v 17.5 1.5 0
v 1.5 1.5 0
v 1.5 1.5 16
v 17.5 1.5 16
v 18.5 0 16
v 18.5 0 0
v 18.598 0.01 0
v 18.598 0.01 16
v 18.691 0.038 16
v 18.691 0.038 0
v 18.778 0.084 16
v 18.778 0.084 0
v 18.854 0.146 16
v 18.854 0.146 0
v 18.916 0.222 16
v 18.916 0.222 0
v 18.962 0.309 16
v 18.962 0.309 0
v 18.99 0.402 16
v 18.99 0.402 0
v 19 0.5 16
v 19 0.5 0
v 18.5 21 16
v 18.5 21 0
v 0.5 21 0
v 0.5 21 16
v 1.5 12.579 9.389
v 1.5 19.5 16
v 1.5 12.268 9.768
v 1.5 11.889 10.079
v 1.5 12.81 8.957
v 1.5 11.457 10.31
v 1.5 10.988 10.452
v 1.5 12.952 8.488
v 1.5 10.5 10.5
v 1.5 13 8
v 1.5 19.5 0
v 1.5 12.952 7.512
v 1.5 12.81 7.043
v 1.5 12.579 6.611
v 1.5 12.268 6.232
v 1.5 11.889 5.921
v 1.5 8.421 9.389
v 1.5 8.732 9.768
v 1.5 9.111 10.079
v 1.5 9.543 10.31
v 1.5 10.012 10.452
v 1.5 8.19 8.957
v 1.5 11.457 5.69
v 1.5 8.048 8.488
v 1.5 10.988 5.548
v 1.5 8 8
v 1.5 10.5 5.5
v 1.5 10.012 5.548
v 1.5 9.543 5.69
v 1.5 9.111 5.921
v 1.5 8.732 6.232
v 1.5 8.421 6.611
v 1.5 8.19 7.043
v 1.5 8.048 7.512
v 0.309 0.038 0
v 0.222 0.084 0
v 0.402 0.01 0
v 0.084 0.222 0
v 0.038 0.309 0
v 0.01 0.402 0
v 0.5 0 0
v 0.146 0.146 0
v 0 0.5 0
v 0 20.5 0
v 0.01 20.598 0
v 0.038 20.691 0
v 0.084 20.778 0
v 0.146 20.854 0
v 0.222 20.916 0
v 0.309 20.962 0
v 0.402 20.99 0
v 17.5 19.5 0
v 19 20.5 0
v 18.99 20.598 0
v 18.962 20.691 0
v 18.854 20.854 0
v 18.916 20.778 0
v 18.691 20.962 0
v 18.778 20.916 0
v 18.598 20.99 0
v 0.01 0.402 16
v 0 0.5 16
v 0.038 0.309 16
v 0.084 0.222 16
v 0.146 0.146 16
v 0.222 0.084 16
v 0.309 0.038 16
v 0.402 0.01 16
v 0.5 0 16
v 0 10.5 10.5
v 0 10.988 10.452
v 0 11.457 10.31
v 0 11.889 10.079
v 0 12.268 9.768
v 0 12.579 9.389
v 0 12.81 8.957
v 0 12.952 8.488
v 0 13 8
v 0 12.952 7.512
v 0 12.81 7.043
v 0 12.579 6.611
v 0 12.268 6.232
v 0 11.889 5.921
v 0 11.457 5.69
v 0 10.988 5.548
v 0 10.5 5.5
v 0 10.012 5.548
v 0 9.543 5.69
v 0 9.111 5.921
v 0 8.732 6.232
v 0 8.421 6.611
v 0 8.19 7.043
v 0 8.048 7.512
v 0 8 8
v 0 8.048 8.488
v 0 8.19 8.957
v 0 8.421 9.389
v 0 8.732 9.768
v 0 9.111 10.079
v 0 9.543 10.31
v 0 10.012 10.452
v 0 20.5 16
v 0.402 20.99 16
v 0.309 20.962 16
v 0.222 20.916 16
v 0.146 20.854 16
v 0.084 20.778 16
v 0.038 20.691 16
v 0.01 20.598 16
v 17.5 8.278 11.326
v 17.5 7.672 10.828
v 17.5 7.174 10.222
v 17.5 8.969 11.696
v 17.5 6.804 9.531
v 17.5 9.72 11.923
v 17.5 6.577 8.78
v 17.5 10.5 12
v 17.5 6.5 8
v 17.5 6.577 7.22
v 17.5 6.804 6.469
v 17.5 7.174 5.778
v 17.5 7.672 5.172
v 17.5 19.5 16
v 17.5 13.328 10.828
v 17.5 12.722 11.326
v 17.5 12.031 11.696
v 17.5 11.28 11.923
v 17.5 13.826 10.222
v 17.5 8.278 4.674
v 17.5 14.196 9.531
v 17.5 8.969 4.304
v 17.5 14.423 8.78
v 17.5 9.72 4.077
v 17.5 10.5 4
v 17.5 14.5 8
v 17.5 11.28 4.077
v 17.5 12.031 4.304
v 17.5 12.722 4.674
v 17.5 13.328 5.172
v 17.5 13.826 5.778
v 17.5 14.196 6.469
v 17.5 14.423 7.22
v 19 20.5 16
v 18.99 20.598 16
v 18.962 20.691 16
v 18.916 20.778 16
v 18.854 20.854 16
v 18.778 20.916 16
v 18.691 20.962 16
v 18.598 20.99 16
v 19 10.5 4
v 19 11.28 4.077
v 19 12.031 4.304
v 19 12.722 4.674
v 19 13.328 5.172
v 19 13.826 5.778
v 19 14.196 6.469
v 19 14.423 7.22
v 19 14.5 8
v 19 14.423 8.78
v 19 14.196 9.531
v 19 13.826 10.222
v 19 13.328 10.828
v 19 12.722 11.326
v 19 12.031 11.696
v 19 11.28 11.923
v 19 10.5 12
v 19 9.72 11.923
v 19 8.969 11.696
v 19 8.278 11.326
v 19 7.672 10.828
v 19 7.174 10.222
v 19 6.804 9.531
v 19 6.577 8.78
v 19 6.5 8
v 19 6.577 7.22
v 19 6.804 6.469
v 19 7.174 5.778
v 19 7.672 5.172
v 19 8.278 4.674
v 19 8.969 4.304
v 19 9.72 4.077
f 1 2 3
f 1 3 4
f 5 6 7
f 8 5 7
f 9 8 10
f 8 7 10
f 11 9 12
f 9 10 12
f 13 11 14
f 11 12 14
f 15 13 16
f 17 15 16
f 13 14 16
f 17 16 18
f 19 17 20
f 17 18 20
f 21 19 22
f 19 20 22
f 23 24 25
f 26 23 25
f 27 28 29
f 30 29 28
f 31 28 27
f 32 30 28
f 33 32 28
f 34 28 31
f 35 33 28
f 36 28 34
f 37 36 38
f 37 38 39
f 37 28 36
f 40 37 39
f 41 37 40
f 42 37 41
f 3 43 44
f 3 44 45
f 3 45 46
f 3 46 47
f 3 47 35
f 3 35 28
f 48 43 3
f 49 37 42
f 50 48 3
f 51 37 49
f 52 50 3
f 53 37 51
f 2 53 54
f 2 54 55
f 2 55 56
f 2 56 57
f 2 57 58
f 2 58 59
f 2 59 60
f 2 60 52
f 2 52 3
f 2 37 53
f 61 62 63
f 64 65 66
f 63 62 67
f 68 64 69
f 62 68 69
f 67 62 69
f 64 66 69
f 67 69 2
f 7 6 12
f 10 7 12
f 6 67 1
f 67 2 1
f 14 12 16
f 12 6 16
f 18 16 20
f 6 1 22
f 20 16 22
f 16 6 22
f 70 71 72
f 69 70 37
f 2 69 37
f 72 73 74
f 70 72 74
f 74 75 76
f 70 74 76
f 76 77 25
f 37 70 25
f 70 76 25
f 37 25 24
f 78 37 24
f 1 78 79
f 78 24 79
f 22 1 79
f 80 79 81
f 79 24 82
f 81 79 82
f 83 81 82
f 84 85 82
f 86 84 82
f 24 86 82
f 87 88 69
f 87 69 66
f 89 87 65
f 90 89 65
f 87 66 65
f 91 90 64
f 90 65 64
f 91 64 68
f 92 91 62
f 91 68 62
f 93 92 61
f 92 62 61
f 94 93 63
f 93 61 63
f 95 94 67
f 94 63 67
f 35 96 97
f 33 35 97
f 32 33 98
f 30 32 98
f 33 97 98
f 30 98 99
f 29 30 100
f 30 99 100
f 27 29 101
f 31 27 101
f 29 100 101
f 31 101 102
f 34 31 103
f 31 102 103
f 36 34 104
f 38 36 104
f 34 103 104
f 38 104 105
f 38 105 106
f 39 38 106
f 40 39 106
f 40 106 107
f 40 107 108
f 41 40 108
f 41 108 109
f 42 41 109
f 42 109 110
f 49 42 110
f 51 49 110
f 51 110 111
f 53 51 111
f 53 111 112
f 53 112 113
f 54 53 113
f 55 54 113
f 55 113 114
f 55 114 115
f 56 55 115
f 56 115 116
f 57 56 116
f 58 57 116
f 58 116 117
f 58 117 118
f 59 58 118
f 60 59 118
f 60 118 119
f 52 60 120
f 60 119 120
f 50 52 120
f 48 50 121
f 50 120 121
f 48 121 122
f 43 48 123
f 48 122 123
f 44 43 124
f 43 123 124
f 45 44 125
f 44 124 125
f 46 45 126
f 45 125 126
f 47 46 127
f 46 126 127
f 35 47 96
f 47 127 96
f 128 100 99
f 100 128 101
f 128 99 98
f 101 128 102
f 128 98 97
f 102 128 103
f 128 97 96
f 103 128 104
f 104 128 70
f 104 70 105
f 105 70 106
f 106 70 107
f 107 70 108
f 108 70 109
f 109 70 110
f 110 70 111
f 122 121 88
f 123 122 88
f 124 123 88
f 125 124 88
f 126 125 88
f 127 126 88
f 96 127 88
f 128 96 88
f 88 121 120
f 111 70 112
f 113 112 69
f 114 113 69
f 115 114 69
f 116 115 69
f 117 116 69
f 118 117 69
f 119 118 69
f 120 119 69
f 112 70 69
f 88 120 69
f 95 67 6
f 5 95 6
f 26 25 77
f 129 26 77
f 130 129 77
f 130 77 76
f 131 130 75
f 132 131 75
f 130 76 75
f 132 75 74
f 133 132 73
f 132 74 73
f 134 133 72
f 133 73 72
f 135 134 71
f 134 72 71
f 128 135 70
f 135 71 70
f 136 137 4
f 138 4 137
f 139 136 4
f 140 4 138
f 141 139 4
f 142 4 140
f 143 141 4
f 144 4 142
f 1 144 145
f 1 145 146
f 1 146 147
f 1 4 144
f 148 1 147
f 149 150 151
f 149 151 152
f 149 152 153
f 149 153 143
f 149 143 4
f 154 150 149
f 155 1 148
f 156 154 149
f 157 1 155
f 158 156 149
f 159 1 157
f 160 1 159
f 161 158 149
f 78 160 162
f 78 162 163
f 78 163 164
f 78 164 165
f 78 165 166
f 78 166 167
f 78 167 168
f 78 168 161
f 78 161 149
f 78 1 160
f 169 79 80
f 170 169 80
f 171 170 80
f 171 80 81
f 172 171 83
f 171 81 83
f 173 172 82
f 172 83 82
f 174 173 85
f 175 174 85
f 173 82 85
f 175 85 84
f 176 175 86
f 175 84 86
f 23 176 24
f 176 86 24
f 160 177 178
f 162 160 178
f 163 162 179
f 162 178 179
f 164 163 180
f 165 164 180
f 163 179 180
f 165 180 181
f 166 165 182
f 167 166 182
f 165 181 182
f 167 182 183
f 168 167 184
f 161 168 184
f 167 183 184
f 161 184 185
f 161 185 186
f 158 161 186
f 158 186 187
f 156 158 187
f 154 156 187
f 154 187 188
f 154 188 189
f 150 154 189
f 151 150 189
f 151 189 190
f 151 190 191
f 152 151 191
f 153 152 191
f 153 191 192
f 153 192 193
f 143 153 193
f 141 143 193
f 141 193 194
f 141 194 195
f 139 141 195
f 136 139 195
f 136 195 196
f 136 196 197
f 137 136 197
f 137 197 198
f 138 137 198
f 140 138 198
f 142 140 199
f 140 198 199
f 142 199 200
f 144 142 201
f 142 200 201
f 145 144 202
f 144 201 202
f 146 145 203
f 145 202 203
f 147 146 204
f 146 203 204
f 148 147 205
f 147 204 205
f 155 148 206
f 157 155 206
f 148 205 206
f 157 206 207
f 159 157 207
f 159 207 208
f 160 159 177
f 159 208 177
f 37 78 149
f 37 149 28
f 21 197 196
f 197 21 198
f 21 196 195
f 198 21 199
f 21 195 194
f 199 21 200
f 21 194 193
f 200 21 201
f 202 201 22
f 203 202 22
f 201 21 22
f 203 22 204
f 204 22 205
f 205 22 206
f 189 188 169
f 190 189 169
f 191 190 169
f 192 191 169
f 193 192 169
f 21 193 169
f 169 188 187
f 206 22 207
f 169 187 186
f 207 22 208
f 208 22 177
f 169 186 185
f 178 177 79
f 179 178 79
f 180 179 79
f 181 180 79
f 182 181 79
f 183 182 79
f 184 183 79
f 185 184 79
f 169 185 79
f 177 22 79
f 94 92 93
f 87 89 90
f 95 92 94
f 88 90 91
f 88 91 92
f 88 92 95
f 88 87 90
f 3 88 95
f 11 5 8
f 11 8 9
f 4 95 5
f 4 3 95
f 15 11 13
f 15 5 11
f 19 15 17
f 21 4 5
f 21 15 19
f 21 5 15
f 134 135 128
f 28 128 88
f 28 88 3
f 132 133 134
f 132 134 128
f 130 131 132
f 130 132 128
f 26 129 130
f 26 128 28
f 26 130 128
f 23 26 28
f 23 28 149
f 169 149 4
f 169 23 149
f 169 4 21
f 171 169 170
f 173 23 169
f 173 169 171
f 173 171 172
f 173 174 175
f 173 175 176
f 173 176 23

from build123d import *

# Parameters (mm, degrees)
DODANIE_WYCI_GNI_CIE1_DEPTH = 16
SKORUPA1_T                  = -1.5
WYTNIJ_WYCI_GNI_CIE2_REACH  = 21
SZKIC12_R                   = 2.5
WYTNIJ_WYCI_GNI_CIE3_REACH  = 21
SZKIC13_R                   = 4


with BuildPart() as part:
    # Szkic1 → Dodanie-wyciągnięcie1 (new body)
    with BuildSketch(Plane.XY):
        with BuildLine():
            Line((0.5, 0), (18.5, 0))
            ThreePointArc((18.5, 0), (18.853553391, 0.146446609), (19, 0.5))
            Line((19, 0.5), (19, 20.5))
            ThreePointArc((19, 20.5), (18.853553391, 20.853553391), (18.5, 21))
            Line((18.5, 21), (0.5, 21))
            ThreePointArc((0.5, 21), (0.146446609, 20.853553391), (0, 20.5))
            Line((0, 20.5), (0, 0.5))
            ThreePointArc((0, 0.5), (0.146446609, 0.146446609), (0.5, 0))
        make_face()
    extrude(amount=DODANIE_WYCI_GNI_CIE1_DEPTH)

    # Skorupa1
    skorupa1_openings = [part.faces().sort_by_distance(p)[0] for p in [
        (9.5, 10.5, 16),
        (9.5, 10.5, 0),
    ]]
    offset(amount=SKORUPA1_T, openings=skorupa1_openings, kind=Kind.INTERSECTION)

    # Szkic12 → Wytnij-wyciągnięcie2 (cut, up to next)
    with BuildSketch(Plane.ZY, mode=Mode.PRIVATE) as wytnij_wyci_gni_cie2_sk1:
        with Locations((8, 10.5)):
            Circle(SZKIC12_R)
    wytnij_wyci_gni_cie2_tool1 = extrude(wytnij_wyci_gni_cie2_sk1.sketch, amount=-WYTNIJ_WYCI_GNI_CIE2_REACH, mode=Mode.PRIVATE) & part.part
    add(wytnij_wyci_gni_cie2_tool1.solids().sort_by_distance((0, 10.5, 8))[0], mode=Mode.SUBTRACT)

    # Szkic13 → Wytnij-wyciągnięcie3 (cut, up to next)
    with BuildSketch(Plane(origin=(19, 0, 0), x_dir=(0, 0, -1), z_dir=(1, 0, 0)), mode=Mode.PRIVATE) as wytnij_wyci_gni_cie3_sk1:
        with Locations((-8, 10.5)):
            Circle(SZKIC13_R)
    wytnij_wyci_gni_cie3_tool1 = extrude(wytnij_wyci_gni_cie3_sk1.sketch, amount=-WYTNIJ_WYCI_GNI_CIE3_REACH, mode=Mode.PRIVATE) & part.part
    add(wytnij_wyci_gni_cie3_tool1.solids().sort_by_distance((19, 10.5, 8))[0], mode=Mode.SUBTRACT)


solid = part.part
